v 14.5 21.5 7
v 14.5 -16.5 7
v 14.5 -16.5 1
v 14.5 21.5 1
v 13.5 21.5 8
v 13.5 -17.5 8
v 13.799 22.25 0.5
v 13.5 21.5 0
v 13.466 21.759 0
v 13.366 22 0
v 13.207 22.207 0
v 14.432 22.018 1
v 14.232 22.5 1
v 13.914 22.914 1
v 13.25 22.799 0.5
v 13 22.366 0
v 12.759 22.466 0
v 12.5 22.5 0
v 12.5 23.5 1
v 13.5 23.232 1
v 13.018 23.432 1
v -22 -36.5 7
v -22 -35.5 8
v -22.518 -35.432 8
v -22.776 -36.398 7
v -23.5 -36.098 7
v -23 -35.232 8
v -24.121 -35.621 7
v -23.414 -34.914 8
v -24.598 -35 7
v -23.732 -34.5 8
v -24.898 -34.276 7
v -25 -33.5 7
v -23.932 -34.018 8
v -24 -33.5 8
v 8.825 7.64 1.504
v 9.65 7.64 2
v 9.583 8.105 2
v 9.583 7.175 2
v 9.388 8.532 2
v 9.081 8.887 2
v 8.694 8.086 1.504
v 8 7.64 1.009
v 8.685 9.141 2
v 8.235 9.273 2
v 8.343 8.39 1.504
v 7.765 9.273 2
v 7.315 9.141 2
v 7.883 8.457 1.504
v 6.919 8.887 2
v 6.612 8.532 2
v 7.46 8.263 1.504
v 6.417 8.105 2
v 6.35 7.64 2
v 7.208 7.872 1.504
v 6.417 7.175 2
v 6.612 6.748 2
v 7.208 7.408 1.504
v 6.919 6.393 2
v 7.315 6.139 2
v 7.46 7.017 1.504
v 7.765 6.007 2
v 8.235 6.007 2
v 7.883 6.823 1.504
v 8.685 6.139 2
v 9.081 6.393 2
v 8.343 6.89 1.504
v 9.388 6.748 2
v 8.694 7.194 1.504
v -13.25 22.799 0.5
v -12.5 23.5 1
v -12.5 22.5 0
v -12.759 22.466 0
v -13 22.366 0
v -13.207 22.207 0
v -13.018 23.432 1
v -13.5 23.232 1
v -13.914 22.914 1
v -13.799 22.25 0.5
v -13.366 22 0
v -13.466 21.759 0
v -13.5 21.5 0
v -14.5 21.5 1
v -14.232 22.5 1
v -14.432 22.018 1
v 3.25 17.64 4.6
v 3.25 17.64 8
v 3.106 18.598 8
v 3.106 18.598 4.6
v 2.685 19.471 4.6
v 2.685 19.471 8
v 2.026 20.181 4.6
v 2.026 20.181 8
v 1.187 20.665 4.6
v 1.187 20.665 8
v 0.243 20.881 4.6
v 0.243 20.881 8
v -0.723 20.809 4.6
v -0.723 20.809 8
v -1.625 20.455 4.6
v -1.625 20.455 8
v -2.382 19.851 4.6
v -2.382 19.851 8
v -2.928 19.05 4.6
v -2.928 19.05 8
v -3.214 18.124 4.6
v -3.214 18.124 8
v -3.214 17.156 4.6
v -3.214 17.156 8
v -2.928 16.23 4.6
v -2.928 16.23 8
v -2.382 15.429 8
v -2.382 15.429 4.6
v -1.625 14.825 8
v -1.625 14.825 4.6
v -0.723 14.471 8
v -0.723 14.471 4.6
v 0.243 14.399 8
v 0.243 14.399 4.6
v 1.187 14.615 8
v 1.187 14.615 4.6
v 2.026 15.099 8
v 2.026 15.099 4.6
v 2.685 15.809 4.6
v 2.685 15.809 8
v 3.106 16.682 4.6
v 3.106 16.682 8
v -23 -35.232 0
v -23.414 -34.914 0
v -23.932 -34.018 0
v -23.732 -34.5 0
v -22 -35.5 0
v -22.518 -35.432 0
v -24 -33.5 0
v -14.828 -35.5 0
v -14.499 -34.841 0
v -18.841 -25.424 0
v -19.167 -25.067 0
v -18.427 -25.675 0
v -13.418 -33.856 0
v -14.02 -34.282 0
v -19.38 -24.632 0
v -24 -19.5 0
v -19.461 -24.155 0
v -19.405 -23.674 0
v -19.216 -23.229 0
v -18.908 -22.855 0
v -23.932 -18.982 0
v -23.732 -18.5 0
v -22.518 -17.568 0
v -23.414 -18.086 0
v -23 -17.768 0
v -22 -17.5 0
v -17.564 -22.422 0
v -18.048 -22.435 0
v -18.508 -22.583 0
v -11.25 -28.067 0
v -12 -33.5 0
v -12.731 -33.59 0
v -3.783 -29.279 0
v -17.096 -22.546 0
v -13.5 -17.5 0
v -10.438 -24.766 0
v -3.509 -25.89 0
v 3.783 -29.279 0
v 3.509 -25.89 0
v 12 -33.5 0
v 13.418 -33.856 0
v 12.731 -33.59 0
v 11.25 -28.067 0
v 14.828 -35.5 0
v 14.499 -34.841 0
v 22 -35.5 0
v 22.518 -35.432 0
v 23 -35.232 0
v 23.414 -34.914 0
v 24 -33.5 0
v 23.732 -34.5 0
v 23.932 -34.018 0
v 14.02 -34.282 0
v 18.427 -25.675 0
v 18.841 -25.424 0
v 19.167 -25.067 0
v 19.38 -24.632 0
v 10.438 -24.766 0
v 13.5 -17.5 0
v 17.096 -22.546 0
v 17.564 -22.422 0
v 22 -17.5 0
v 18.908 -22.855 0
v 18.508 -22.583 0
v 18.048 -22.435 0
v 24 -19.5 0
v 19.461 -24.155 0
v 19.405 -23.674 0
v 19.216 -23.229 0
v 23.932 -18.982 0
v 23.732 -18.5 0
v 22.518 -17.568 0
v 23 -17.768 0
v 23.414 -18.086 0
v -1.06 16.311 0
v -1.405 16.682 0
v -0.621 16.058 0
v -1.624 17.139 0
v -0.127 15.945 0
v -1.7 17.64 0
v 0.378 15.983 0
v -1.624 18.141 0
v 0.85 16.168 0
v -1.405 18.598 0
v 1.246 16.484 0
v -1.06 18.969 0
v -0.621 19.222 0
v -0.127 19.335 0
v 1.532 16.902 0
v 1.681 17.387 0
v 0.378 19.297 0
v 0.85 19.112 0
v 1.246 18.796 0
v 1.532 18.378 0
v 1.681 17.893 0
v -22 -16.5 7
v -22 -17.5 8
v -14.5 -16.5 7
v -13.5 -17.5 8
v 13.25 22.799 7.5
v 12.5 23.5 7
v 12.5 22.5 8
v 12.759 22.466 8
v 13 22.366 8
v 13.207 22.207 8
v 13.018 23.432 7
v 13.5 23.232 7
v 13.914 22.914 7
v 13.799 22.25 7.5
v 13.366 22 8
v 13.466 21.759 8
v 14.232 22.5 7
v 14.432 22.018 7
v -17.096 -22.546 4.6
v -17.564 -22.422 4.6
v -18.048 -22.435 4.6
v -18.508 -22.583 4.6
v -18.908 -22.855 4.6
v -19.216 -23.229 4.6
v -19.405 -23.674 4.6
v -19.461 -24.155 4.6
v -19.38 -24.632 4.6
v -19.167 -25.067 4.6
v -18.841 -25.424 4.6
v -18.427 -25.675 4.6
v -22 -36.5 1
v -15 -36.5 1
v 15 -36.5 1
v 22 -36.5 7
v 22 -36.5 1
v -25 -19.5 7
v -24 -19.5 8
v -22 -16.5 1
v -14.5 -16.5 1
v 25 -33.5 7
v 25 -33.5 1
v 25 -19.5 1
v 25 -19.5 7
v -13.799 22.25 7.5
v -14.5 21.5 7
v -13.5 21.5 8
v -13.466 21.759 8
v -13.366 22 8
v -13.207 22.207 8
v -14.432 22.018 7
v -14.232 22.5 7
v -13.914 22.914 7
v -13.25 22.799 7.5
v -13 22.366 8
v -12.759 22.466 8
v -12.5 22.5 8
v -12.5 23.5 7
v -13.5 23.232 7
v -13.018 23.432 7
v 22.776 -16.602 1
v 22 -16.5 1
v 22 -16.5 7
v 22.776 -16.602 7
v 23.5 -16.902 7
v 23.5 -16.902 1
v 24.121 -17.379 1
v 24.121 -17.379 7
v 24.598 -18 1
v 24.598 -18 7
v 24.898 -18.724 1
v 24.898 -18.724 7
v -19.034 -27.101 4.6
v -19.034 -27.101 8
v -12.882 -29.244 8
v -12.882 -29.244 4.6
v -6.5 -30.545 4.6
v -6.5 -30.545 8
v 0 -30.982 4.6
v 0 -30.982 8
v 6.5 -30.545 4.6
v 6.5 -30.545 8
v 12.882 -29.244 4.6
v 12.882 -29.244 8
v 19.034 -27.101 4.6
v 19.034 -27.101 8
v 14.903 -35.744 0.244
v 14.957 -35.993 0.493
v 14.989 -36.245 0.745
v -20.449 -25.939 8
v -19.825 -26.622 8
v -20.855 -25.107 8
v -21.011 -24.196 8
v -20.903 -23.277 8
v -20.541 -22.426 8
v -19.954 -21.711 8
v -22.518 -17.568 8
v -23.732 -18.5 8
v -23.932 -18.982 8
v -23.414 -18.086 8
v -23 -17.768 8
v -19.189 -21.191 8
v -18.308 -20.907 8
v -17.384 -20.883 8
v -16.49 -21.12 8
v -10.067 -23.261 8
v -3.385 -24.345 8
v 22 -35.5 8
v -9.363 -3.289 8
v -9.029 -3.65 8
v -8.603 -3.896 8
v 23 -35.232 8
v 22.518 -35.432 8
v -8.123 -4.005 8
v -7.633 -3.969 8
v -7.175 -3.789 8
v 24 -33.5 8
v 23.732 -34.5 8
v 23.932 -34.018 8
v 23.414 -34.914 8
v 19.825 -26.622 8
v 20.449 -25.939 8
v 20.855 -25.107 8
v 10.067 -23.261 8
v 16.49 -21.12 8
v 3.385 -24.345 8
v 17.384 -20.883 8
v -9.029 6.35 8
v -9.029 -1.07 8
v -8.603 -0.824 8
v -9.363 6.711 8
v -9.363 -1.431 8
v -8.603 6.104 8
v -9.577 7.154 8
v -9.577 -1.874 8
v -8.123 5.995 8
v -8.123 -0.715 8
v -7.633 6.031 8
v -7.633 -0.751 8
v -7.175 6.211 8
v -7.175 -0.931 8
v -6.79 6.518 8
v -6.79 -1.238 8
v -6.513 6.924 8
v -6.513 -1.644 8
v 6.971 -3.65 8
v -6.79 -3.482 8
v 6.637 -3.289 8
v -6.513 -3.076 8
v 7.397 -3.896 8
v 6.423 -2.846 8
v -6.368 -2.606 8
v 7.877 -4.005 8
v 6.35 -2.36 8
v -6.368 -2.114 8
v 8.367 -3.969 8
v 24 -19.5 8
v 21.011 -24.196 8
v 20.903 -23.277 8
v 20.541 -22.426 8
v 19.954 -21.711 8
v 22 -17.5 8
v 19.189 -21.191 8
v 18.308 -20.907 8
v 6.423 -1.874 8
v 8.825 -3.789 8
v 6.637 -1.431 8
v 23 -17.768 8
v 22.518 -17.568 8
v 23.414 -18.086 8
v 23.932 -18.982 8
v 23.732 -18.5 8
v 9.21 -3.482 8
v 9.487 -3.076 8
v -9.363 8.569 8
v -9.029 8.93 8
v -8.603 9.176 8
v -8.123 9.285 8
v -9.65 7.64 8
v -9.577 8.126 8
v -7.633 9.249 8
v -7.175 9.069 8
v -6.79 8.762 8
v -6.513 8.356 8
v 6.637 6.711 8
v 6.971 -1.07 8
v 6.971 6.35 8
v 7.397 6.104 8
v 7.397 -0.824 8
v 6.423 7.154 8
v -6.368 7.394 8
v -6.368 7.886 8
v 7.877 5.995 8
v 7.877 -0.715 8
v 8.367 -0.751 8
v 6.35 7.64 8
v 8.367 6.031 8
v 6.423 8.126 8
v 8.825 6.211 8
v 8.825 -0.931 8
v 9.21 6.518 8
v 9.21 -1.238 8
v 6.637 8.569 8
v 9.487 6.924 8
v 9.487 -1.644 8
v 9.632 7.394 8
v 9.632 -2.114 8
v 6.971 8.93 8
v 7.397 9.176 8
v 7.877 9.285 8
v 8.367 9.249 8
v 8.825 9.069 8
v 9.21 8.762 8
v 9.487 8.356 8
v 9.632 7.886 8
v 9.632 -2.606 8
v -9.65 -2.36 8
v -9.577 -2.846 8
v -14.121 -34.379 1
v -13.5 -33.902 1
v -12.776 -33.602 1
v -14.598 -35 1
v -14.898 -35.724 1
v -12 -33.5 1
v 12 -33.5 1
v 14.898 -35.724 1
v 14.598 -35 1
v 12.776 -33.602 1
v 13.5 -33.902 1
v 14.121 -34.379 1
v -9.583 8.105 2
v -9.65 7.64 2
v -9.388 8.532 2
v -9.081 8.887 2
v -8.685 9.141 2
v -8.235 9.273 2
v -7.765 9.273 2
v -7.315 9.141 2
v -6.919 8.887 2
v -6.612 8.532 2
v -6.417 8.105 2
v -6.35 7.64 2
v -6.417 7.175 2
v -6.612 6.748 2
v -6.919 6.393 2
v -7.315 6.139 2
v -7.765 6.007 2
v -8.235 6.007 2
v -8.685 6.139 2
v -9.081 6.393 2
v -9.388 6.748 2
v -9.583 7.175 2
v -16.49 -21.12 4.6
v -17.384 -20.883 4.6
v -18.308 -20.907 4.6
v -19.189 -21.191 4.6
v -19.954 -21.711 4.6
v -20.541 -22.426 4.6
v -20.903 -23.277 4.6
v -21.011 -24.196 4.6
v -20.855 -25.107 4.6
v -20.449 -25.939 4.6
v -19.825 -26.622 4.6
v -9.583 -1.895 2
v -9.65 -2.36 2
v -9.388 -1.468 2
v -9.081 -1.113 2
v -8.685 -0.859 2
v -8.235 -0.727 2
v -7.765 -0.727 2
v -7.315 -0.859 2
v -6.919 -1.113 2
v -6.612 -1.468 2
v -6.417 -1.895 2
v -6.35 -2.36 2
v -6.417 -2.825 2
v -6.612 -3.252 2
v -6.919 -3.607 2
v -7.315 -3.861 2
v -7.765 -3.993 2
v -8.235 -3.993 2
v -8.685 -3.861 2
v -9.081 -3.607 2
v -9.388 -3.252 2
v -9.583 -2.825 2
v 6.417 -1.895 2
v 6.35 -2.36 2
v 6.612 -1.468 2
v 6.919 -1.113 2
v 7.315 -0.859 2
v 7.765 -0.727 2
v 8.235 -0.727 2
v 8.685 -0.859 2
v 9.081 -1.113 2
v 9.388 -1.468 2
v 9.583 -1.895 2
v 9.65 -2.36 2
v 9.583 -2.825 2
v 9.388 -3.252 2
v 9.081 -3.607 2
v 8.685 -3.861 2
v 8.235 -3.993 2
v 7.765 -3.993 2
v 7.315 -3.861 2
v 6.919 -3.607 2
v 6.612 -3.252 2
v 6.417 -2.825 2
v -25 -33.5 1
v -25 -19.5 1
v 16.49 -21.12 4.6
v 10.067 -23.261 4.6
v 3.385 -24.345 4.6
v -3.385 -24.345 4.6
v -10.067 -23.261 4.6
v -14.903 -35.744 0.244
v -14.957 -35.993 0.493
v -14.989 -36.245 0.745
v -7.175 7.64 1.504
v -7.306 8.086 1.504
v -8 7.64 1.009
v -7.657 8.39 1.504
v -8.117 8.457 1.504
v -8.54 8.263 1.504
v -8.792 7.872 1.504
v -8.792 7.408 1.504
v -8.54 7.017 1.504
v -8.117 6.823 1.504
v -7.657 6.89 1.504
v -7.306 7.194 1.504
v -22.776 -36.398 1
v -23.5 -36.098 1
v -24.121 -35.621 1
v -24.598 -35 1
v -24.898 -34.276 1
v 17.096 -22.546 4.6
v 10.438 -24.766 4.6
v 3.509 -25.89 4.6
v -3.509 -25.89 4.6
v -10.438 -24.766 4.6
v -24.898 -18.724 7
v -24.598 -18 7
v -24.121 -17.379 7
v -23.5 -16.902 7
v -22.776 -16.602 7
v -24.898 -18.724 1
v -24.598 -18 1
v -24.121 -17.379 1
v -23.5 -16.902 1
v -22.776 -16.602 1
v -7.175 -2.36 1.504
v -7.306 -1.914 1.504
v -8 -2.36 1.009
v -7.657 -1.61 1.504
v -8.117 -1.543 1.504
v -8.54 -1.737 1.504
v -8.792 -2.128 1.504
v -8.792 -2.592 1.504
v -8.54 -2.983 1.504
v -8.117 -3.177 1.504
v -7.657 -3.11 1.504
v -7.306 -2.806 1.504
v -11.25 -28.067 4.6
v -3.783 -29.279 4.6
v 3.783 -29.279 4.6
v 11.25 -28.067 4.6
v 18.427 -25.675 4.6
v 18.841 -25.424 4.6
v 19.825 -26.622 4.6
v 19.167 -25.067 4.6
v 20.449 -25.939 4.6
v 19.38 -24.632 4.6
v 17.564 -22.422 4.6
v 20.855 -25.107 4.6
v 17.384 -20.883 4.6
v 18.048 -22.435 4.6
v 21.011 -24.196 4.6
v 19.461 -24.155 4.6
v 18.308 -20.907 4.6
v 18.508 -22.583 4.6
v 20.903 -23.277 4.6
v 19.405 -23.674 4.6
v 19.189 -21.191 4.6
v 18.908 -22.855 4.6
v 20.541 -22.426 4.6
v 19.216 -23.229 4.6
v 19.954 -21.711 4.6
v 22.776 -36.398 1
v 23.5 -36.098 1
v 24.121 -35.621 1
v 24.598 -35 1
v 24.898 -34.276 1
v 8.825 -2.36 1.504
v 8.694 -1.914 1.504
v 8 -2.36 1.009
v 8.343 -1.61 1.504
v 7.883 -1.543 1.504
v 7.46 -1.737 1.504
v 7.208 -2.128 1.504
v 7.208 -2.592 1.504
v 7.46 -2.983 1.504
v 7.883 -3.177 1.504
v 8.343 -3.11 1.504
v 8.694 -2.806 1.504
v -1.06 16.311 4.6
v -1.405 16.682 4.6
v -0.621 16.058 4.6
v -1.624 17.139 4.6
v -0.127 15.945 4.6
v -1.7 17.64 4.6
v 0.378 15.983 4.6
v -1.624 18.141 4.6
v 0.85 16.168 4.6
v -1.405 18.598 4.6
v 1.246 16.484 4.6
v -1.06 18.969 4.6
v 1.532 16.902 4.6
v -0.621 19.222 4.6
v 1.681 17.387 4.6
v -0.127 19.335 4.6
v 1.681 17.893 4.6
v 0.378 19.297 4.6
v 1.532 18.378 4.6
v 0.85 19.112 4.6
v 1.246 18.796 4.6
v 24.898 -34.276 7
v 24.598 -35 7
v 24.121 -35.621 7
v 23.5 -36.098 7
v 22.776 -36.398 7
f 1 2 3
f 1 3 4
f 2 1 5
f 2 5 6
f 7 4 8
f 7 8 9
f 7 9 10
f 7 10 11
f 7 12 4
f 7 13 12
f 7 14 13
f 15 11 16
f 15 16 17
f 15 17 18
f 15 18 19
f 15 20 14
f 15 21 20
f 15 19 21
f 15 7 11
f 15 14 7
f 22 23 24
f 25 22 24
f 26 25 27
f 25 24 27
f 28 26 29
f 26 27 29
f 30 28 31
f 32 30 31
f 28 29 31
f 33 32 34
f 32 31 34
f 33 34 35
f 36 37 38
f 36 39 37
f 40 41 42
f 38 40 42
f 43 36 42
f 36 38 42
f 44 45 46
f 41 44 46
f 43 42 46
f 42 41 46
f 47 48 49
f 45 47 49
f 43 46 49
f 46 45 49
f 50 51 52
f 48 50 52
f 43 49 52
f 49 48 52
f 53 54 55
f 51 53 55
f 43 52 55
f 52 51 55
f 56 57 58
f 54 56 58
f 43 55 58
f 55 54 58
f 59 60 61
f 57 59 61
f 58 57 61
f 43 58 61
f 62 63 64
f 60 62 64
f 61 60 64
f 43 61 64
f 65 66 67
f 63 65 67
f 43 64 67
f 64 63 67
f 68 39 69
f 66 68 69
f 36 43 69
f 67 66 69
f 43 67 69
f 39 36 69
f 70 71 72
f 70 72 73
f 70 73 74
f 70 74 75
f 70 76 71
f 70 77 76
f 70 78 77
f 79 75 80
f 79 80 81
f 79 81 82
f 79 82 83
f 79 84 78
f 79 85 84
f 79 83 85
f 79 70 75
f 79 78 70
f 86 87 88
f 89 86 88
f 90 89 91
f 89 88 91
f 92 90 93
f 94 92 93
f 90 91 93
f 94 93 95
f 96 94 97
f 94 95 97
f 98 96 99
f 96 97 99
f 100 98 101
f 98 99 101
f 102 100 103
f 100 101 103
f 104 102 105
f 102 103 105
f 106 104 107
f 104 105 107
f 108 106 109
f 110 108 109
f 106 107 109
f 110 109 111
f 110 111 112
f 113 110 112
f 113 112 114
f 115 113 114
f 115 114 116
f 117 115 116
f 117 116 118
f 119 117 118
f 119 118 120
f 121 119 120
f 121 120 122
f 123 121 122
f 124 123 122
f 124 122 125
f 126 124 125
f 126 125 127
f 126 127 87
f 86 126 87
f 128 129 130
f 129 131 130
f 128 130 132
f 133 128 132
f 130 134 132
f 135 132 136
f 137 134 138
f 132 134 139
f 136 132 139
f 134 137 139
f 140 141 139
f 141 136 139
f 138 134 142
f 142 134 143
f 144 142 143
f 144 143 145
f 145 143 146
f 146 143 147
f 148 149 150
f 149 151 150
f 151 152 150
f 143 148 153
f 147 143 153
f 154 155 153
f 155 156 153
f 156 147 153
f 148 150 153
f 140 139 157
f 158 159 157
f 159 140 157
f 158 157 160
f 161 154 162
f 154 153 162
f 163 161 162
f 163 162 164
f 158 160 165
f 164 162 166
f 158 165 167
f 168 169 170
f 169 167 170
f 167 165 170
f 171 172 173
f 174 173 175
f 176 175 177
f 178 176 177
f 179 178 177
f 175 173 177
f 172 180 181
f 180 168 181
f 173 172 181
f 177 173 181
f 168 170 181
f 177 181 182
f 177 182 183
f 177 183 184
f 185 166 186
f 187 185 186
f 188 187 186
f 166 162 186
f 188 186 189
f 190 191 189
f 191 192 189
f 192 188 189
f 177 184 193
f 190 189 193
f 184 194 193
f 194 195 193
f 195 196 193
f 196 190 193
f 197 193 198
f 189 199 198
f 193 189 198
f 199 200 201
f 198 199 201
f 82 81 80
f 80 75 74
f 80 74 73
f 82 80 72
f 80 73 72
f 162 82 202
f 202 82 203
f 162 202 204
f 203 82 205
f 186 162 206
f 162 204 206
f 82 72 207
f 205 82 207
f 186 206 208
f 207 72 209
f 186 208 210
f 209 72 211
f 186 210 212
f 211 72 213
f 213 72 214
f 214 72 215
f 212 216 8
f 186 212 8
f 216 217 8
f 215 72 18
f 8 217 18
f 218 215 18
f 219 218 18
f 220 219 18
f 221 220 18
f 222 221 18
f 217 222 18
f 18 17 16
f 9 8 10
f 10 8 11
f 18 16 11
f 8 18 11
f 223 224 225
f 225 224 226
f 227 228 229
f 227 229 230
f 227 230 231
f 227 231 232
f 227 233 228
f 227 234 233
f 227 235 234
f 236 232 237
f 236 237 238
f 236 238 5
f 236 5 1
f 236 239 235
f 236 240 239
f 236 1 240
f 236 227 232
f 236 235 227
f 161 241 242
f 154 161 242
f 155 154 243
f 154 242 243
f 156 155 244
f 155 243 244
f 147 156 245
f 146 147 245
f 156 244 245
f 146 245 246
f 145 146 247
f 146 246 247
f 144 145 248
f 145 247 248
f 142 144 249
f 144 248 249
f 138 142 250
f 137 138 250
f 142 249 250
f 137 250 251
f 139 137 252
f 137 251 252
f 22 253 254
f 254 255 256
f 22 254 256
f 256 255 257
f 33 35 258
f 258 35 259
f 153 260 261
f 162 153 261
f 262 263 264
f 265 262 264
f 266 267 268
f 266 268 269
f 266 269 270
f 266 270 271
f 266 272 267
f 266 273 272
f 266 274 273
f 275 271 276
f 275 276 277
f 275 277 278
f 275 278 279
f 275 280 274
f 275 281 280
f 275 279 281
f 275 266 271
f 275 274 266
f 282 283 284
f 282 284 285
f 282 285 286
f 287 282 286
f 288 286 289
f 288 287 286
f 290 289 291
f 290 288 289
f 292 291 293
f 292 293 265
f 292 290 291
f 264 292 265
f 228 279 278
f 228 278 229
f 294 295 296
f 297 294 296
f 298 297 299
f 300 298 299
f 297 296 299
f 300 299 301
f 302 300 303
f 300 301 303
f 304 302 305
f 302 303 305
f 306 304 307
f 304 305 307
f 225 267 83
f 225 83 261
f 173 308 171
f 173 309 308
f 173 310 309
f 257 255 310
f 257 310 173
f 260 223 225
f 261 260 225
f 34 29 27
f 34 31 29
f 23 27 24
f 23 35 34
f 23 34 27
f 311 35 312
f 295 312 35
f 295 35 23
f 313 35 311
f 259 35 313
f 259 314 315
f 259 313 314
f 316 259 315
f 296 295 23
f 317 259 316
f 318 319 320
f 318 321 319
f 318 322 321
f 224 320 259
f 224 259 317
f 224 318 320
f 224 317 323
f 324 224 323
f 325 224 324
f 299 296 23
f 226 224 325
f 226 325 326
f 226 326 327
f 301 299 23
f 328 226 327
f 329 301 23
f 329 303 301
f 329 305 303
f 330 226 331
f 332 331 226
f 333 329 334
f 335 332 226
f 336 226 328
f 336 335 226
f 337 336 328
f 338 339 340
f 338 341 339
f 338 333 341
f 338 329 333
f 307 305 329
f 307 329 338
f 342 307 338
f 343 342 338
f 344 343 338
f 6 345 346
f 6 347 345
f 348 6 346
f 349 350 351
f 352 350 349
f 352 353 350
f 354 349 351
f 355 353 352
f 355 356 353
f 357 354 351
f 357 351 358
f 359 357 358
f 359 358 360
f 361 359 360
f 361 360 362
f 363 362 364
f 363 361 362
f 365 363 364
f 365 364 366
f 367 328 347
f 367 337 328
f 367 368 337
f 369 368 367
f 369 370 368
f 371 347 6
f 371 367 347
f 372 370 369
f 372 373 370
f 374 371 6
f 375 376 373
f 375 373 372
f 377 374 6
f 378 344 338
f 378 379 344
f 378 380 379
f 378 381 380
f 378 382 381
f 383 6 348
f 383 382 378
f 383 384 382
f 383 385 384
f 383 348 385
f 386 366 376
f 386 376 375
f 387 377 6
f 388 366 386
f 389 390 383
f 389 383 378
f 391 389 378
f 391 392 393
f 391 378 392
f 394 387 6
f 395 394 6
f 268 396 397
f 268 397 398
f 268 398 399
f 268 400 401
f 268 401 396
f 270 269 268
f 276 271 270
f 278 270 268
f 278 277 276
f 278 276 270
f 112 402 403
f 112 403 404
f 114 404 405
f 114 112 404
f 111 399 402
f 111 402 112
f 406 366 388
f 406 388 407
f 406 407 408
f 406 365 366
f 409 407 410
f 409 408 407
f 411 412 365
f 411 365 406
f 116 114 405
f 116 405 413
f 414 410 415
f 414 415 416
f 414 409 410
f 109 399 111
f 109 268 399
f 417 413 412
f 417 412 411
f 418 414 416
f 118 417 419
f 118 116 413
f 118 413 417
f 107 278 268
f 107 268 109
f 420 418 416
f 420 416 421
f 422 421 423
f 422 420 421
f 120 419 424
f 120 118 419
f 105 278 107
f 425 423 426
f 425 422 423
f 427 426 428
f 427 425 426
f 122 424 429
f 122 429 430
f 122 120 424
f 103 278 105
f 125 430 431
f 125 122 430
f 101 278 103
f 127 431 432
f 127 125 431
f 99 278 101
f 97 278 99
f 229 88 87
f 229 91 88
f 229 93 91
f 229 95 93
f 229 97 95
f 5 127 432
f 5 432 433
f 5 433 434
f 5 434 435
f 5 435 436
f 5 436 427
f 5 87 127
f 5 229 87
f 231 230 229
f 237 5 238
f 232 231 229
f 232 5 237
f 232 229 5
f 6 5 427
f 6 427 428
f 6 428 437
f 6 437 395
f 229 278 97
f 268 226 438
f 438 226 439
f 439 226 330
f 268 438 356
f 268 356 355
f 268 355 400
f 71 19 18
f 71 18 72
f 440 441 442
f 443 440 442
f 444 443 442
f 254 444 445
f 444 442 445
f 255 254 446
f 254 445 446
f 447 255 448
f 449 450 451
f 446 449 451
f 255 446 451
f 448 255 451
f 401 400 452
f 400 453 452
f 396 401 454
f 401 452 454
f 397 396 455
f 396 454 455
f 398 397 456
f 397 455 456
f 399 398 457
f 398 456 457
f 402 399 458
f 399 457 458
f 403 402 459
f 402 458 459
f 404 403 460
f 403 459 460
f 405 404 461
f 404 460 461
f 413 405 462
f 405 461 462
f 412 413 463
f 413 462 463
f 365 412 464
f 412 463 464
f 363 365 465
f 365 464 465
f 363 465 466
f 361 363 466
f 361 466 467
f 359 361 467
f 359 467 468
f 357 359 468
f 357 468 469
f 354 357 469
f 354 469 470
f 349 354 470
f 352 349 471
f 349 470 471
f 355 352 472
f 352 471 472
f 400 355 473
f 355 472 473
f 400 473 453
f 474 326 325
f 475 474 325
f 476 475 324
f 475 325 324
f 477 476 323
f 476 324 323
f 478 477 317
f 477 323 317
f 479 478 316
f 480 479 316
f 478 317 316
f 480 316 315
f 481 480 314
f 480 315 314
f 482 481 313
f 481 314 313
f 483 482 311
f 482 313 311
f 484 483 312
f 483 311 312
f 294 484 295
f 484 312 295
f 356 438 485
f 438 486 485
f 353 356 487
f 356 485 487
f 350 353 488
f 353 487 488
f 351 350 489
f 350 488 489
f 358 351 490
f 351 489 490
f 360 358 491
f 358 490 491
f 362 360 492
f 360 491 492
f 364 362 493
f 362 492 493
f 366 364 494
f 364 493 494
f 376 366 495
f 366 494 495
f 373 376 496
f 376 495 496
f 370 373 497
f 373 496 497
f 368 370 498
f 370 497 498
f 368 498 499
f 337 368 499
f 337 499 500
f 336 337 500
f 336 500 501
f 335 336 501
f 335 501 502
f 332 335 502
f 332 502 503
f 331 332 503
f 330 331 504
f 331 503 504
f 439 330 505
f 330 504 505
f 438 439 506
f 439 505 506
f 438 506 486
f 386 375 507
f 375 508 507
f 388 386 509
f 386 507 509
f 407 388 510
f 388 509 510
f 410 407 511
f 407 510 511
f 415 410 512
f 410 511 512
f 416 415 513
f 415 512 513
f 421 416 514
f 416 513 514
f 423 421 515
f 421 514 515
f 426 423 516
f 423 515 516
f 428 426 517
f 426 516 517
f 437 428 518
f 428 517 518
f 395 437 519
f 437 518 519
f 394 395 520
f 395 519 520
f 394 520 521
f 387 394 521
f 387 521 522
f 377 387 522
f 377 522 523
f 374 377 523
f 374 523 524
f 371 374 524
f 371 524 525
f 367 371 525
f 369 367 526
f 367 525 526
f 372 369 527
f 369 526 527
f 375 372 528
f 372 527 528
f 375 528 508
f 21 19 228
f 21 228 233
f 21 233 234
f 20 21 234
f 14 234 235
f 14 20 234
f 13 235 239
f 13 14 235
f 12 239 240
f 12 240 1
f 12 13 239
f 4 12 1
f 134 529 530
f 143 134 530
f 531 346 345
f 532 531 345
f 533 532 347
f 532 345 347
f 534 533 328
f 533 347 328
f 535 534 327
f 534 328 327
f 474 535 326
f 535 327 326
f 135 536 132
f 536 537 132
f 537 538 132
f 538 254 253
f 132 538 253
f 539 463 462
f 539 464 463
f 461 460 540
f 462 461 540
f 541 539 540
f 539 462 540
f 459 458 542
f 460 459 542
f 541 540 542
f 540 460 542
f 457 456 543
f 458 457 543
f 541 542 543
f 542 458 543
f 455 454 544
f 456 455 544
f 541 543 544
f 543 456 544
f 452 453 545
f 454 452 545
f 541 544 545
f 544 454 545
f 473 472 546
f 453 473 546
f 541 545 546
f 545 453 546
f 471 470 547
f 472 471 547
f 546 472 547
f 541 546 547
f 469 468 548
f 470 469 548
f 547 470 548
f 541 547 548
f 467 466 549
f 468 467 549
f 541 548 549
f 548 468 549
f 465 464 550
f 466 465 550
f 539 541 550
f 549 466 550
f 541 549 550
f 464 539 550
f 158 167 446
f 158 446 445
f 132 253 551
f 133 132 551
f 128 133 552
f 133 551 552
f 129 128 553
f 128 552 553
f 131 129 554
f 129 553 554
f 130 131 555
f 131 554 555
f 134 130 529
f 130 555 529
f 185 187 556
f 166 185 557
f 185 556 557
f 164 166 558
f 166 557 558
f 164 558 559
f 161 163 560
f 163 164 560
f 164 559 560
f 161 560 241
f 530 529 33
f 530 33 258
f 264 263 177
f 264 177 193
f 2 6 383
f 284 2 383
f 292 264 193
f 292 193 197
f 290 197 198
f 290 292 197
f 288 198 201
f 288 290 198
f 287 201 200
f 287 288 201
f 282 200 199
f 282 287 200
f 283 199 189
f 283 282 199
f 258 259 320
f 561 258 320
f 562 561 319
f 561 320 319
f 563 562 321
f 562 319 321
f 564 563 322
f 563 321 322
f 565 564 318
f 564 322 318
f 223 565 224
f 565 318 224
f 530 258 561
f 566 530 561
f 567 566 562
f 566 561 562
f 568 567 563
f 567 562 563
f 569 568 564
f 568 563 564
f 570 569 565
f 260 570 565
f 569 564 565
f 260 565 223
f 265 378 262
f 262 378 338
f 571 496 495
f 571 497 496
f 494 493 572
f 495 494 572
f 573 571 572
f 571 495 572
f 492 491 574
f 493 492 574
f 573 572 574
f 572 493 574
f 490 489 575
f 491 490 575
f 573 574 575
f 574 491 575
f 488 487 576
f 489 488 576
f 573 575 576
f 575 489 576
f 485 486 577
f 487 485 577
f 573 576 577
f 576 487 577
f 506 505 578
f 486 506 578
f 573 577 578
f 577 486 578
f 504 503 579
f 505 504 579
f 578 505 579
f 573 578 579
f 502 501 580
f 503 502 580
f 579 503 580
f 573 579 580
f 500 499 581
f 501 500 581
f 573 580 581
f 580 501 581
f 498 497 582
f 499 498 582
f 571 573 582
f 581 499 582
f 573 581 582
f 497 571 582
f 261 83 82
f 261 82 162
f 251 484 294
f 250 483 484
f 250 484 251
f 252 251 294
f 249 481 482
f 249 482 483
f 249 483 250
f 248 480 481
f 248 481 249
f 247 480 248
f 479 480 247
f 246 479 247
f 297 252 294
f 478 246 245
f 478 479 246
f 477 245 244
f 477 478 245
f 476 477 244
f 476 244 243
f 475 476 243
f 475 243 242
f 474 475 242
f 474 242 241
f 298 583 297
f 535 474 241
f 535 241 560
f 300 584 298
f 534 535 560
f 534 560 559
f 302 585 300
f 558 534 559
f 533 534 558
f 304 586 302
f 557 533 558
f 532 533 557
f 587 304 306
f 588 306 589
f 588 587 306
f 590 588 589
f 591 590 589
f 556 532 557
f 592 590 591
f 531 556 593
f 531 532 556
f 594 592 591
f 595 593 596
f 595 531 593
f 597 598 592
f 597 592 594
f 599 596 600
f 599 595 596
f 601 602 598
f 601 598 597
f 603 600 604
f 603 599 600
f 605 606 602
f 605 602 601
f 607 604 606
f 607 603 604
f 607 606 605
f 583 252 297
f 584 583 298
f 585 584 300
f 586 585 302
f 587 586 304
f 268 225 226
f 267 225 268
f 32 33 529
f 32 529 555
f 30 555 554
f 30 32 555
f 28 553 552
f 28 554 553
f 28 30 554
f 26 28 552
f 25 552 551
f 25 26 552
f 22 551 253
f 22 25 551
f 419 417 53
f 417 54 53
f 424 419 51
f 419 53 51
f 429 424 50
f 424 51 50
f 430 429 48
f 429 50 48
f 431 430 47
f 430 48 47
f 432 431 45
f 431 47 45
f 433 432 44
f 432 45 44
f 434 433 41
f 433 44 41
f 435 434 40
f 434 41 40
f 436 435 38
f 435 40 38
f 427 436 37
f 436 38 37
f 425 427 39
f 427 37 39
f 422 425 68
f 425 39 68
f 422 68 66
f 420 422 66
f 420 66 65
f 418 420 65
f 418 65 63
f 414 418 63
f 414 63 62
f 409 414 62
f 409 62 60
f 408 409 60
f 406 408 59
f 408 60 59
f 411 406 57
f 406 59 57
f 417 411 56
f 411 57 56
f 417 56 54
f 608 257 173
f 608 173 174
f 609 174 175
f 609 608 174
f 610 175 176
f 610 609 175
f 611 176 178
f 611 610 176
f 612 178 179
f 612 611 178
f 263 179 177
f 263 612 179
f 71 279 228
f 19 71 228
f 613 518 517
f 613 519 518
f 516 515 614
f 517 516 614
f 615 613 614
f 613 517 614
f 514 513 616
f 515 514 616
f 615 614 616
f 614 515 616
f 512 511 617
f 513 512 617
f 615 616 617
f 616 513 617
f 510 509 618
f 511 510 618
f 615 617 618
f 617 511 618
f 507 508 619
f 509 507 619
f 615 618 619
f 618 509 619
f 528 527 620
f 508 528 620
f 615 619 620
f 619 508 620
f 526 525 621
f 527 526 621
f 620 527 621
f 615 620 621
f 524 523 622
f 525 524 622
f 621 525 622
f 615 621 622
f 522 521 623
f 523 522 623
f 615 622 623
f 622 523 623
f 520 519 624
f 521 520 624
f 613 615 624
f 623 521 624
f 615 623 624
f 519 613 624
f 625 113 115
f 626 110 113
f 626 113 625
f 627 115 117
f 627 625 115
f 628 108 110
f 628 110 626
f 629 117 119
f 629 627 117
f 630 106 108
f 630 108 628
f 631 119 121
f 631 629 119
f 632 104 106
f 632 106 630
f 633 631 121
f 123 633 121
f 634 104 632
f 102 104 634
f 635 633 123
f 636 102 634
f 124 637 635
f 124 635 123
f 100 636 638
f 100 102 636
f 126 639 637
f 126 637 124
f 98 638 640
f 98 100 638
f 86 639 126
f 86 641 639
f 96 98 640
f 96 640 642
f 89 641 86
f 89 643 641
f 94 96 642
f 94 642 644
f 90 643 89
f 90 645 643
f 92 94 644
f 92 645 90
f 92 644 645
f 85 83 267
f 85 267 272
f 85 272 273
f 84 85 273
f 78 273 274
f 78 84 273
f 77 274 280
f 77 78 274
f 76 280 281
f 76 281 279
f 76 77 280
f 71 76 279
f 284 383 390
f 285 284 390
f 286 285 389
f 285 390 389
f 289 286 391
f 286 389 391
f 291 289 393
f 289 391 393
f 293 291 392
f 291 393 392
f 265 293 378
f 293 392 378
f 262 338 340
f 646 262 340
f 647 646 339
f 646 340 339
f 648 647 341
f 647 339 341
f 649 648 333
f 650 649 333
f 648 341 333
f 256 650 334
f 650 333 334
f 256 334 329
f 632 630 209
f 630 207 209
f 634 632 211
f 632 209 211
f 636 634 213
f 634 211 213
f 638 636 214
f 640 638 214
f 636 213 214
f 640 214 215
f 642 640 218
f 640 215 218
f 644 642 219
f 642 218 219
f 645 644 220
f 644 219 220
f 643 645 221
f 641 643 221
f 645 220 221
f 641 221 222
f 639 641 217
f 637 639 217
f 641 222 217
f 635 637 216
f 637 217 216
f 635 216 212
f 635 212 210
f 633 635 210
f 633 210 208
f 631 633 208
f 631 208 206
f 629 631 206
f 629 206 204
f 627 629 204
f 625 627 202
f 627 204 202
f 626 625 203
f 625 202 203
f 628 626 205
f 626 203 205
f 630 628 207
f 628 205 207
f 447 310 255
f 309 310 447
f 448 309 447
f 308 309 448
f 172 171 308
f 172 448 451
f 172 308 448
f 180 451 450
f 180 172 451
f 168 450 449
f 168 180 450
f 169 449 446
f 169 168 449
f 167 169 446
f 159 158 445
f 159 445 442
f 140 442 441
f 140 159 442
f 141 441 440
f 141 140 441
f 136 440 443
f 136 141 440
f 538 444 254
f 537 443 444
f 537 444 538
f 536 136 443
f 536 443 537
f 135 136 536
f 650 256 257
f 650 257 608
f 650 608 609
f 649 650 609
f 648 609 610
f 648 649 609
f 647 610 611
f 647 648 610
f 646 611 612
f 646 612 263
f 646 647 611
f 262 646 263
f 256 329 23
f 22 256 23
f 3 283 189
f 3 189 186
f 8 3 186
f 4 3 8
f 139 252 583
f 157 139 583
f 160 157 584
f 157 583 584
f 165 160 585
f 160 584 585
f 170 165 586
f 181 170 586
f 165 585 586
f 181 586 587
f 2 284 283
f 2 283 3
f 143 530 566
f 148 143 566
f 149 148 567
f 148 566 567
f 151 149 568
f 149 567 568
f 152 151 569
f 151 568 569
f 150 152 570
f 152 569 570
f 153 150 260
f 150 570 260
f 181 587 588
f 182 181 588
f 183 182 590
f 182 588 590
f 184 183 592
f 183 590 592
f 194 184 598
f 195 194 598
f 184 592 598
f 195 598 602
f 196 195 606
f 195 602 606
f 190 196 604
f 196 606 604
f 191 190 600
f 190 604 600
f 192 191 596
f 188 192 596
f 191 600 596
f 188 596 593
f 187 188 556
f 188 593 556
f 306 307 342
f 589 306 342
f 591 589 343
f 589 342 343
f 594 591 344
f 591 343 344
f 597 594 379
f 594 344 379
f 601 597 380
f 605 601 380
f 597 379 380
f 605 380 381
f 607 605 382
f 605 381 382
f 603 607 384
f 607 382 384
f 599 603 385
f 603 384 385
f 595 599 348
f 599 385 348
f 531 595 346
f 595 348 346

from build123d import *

# Parameters (mm, degrees)
SKETCH1_W                                           = 50
SKETCH1_H                                           = 73
BOSS_EXTRUDE1_DEPTH                                 = 8
CBORE_FOR_M3_HEX_SOCKET_HEAD_CAP_SCREW1_D           = 3.4
CBORE_FOR_M3_HEX_SOCKET_HEAD_CAP_SCREW1_CBORE_D     = 6.5
CBORE_FOR_M3_HEX_SOCKET_HEAD_CAP_SCREW1_CBORE_DEPTH = 3.4
CUT_EXTRUDE1_DEPTH                                  = 3.4
CUT_EXTRUDE2_DEPTH                                  = 16.4
SKETCH9_W                                           = 50
SKETCH9_H                                           = 13
CUT_EXTRUDE3_DEPTH                                  = 10
CUT_EXTRUDE6_DEPTH                                  = 49
FILLET1_R                                           = 3
FILLET2_R                                           = 2
M4_TAPPED_HOLE1_D                                   = 3.3
M4_TAPPED_HOLE1_DEPTH                               = 6
M4_TAPPED_HOLE1_TIP                                 = 0.991420021
CUT_EXTRUDE9_DEPTH                                  = 1
CHAMFER2_SIZE                                       = 1
CHAMFER3_SIZE                                       = 1


with BuildPart() as part:
    # Sketch1 → Boss-Extrude1 (new body)
    with BuildSketch(Plane.XY):
        Rectangle(SKETCH1_W, SKETCH1_H)
    extrude(amount=BOSS_EXTRUDE1_DEPTH)

    # CBORE for M3 Hex Socket Head Cap Screw1 (through all)
    with Locations(Plane.XY.offset(8)):
        with Locations((0, 17.64)):
            CounterBoreHole(CBORE_FOR_M3_HEX_SOCKET_HEAD_CAP_SCREW1_D / 2, CBORE_FOR_M3_HEX_SOCKET_HEAD_CAP_SCREW1_CBORE_D / 2, CBORE_FOR_M3_HEX_SOCKET_HEAD_CAP_SCREW1_CBORE_DEPTH)

    # Sketch5 → Cut-Extrude1 (cut)
    with BuildSketch(Plane.XY.offset(8)):
        with BuildLine():
            ThreePointArc((-19.034141209, -27.101138862), (0, -30.981682799), (19.034141209, -27.101138862))
            ThreePointArc((19.034141209, -27.101138862), (20.752463932, -22.838232925), (16.489557996, -21.119910203))
            ThreePointArc((16.489557996, -21.119910203), (0, -24.481682799), (-16.489557996, -21.119910203))
            ThreePointArc((-16.489557996, -21.119910203), (-20.752463932, -22.838232925), (-19.034141209, -27.101138862))
        make_face()
    extrude(amount=-CUT_EXTRUDE1_DEPTH, mode=Mode.SUBTRACT)

    # Sketch6 → Cut-Extrude2 (cut)
    with BuildSketch(Plane.XY.offset(4.6)):
        with BuildLine():
            ThreePointArc((-18.427355981, -25.674845874), (0, -29.431682799), (18.427355981, -25.674845874))
            ThreePointArc((18.427355981, -25.674845874), (19.326170944, -23.445018153), (17.096343223, -22.546203191))
            ThreePointArc((17.096343223, -22.546203191), (0, -26.031682799), (-17.096343223, -22.546203191))
            ThreePointArc((-17.096343223, -22.546203191), (-19.326170944, -23.445018153), (-18.427355981, -25.674845874))
        make_face()
    extrude(amount=-CUT_EXTRUDE2_DEPTH, mode=Mode.SUBTRACT)

    # Sketch9 → Cut-Extrude3 (cut)
    with BuildSketch(Plane.XY.offset(8)):
        with Locations((0, 30)):
            Rectangle(SKETCH9_W, SKETCH9_H)
    extrude(amount=-CUT_EXTRUDE3_DEPTH, mode=Mode.SUBTRACT)

    # Sketch10 → Cut-Extrude6 (cut)
    with BuildSketch(Plane.XY.offset(8)):
        Polygon((-14.5, 23.5), (-14.5, -16.5), (-25, -16.5), (-32.867212943, -16.5), (-35.349336633, 40.207518582), (-6.106494824, 43.004037027), (18.040764003, 43.004037027), (35.555684922, 29.266712136), (37.966370543, 22.69314443), (41.94143417, 11.853759291), (39.953902356, 3.910005632), (32.212385861, -8.825532839), (28.601359922, -14.76601747), (25, -16.5), (14.5, -16.5), (14.5, 23.5), align=None)
    extrude(amount=-CUT_EXTRUDE6_DEPTH, mode=Mode.SUBTRACT)

    # Fillet1
    fillet1_edges = [part.edges().sort_by_distance(p)[0] for p in [
        (25, -36.5, 4),
        (-25, -36.5, 4),
        (25, -16.5, 4),
        (-25, -16.5, 4),
    ]]
    fillet(fillet1_edges, radius=FILLET1_R)

    # Fillet2
    fillet2_edges = [part.edges().sort_by_distance(p)[0] for p in [
        (-14.5, 23.5, 4),
        (14.5, 23.5, 4),
    ]]
    fillet(fillet2_edges, radius=FILLET2_R)

    # M4 Tapped Hole1
    with Locations(Plane.XY.offset(8)):
        with Locations((-8, -2.36), (8, -2.36), (-8, 7.64), (8, 7.64)):
            Hole(M4_TAPPED_HOLE1_D / 2, depth=M4_TAPPED_HOLE1_DEPTH)
            with Locations((0, 0, -(M4_TAPPED_HOLE1_DEPTH + M4_TAPPED_HOLE1_TIP / 2))):  # 118° drill point
                Cone(0, M4_TAPPED_HOLE1_D / 2, M4_TAPPED_HOLE1_TIP, mode=Mode.SUBTRACT)

    # Sketch14 → Cut-Extrude9 (cut)
    with BuildSketch(Plane(origin=(0, 0, 0), x_dir=(-1, 0, 0), z_dir=(0, 0, -1))):
        with BuildLine():
            Line((-12, -33.5), (12, -33.5))
            ThreePointArc((12, -33.5), (14.121320344, -34.378679656), (15, -36.5))
            Line((15, -36.5), (-15, -36.5))
            ThreePointArc((-15, -36.5), (-14.121320344, -34.378679656), (-12, -33.5))
        make_face()
    extrude(amount=-CUT_EXTRUDE9_DEPTH, mode=Mode.SUBTRACT)

    # Chamfer2
    chamfer2_edges = [part.edges().sort_by_distance(p)[0] for p in [
        (-18.25, -16.5, 8),
        (18.25, -16.5, 8),
        (-24.121320344, -17.378679656, 8),
        (24.121320344, -17.378679656, 8),
        (-25, -26.5, 8),
        (25, -26.5, 8),
        (-24.121320344, -35.621320344, 8),
        (24.121320344, -35.621320344, 8),
        (0, -36.5, 8),
        (-14.5, 2.5, 0),
        (-13.914213562, 22.914213562, 0),
        (0, 23.5, 0),
        (13.914213562, 22.914213562, 0),
        (14.5, 2.5, 0),
        (18.25, -16.5, 0),
        (24.121320344, -17.378679656, 0),
        (25, -26.5, 0),
        (24.121320344, -35.621320344, 0),
        (18.5, -36.5, 0),
        (-18.25, -16.5, 0),
        (-24.121320344, -17.378679656, 0),
        (-25, -26.5, 0),
        (-24.121320344, -35.621320344, 0),
        (-18.5, -36.5, 0),
    ]]
    chamfer(chamfer2_edges, length=CHAMFER2_SIZE)

    # Chamfer3
    chamfer3_edges = [part.edges().sort_by_distance(p)[0] for p in [
        (14.5, 2, 8),
        (13.914213562, 22.914213562, 8),
        (0, 23.5, 8),
        (-13.914213562, 22.914213562, 8),
        (-14.5, 2, 8),
    ]]
    chamfer(chamfer3_edges, length=CHAMFER3_SIZE)


solid = part.part
